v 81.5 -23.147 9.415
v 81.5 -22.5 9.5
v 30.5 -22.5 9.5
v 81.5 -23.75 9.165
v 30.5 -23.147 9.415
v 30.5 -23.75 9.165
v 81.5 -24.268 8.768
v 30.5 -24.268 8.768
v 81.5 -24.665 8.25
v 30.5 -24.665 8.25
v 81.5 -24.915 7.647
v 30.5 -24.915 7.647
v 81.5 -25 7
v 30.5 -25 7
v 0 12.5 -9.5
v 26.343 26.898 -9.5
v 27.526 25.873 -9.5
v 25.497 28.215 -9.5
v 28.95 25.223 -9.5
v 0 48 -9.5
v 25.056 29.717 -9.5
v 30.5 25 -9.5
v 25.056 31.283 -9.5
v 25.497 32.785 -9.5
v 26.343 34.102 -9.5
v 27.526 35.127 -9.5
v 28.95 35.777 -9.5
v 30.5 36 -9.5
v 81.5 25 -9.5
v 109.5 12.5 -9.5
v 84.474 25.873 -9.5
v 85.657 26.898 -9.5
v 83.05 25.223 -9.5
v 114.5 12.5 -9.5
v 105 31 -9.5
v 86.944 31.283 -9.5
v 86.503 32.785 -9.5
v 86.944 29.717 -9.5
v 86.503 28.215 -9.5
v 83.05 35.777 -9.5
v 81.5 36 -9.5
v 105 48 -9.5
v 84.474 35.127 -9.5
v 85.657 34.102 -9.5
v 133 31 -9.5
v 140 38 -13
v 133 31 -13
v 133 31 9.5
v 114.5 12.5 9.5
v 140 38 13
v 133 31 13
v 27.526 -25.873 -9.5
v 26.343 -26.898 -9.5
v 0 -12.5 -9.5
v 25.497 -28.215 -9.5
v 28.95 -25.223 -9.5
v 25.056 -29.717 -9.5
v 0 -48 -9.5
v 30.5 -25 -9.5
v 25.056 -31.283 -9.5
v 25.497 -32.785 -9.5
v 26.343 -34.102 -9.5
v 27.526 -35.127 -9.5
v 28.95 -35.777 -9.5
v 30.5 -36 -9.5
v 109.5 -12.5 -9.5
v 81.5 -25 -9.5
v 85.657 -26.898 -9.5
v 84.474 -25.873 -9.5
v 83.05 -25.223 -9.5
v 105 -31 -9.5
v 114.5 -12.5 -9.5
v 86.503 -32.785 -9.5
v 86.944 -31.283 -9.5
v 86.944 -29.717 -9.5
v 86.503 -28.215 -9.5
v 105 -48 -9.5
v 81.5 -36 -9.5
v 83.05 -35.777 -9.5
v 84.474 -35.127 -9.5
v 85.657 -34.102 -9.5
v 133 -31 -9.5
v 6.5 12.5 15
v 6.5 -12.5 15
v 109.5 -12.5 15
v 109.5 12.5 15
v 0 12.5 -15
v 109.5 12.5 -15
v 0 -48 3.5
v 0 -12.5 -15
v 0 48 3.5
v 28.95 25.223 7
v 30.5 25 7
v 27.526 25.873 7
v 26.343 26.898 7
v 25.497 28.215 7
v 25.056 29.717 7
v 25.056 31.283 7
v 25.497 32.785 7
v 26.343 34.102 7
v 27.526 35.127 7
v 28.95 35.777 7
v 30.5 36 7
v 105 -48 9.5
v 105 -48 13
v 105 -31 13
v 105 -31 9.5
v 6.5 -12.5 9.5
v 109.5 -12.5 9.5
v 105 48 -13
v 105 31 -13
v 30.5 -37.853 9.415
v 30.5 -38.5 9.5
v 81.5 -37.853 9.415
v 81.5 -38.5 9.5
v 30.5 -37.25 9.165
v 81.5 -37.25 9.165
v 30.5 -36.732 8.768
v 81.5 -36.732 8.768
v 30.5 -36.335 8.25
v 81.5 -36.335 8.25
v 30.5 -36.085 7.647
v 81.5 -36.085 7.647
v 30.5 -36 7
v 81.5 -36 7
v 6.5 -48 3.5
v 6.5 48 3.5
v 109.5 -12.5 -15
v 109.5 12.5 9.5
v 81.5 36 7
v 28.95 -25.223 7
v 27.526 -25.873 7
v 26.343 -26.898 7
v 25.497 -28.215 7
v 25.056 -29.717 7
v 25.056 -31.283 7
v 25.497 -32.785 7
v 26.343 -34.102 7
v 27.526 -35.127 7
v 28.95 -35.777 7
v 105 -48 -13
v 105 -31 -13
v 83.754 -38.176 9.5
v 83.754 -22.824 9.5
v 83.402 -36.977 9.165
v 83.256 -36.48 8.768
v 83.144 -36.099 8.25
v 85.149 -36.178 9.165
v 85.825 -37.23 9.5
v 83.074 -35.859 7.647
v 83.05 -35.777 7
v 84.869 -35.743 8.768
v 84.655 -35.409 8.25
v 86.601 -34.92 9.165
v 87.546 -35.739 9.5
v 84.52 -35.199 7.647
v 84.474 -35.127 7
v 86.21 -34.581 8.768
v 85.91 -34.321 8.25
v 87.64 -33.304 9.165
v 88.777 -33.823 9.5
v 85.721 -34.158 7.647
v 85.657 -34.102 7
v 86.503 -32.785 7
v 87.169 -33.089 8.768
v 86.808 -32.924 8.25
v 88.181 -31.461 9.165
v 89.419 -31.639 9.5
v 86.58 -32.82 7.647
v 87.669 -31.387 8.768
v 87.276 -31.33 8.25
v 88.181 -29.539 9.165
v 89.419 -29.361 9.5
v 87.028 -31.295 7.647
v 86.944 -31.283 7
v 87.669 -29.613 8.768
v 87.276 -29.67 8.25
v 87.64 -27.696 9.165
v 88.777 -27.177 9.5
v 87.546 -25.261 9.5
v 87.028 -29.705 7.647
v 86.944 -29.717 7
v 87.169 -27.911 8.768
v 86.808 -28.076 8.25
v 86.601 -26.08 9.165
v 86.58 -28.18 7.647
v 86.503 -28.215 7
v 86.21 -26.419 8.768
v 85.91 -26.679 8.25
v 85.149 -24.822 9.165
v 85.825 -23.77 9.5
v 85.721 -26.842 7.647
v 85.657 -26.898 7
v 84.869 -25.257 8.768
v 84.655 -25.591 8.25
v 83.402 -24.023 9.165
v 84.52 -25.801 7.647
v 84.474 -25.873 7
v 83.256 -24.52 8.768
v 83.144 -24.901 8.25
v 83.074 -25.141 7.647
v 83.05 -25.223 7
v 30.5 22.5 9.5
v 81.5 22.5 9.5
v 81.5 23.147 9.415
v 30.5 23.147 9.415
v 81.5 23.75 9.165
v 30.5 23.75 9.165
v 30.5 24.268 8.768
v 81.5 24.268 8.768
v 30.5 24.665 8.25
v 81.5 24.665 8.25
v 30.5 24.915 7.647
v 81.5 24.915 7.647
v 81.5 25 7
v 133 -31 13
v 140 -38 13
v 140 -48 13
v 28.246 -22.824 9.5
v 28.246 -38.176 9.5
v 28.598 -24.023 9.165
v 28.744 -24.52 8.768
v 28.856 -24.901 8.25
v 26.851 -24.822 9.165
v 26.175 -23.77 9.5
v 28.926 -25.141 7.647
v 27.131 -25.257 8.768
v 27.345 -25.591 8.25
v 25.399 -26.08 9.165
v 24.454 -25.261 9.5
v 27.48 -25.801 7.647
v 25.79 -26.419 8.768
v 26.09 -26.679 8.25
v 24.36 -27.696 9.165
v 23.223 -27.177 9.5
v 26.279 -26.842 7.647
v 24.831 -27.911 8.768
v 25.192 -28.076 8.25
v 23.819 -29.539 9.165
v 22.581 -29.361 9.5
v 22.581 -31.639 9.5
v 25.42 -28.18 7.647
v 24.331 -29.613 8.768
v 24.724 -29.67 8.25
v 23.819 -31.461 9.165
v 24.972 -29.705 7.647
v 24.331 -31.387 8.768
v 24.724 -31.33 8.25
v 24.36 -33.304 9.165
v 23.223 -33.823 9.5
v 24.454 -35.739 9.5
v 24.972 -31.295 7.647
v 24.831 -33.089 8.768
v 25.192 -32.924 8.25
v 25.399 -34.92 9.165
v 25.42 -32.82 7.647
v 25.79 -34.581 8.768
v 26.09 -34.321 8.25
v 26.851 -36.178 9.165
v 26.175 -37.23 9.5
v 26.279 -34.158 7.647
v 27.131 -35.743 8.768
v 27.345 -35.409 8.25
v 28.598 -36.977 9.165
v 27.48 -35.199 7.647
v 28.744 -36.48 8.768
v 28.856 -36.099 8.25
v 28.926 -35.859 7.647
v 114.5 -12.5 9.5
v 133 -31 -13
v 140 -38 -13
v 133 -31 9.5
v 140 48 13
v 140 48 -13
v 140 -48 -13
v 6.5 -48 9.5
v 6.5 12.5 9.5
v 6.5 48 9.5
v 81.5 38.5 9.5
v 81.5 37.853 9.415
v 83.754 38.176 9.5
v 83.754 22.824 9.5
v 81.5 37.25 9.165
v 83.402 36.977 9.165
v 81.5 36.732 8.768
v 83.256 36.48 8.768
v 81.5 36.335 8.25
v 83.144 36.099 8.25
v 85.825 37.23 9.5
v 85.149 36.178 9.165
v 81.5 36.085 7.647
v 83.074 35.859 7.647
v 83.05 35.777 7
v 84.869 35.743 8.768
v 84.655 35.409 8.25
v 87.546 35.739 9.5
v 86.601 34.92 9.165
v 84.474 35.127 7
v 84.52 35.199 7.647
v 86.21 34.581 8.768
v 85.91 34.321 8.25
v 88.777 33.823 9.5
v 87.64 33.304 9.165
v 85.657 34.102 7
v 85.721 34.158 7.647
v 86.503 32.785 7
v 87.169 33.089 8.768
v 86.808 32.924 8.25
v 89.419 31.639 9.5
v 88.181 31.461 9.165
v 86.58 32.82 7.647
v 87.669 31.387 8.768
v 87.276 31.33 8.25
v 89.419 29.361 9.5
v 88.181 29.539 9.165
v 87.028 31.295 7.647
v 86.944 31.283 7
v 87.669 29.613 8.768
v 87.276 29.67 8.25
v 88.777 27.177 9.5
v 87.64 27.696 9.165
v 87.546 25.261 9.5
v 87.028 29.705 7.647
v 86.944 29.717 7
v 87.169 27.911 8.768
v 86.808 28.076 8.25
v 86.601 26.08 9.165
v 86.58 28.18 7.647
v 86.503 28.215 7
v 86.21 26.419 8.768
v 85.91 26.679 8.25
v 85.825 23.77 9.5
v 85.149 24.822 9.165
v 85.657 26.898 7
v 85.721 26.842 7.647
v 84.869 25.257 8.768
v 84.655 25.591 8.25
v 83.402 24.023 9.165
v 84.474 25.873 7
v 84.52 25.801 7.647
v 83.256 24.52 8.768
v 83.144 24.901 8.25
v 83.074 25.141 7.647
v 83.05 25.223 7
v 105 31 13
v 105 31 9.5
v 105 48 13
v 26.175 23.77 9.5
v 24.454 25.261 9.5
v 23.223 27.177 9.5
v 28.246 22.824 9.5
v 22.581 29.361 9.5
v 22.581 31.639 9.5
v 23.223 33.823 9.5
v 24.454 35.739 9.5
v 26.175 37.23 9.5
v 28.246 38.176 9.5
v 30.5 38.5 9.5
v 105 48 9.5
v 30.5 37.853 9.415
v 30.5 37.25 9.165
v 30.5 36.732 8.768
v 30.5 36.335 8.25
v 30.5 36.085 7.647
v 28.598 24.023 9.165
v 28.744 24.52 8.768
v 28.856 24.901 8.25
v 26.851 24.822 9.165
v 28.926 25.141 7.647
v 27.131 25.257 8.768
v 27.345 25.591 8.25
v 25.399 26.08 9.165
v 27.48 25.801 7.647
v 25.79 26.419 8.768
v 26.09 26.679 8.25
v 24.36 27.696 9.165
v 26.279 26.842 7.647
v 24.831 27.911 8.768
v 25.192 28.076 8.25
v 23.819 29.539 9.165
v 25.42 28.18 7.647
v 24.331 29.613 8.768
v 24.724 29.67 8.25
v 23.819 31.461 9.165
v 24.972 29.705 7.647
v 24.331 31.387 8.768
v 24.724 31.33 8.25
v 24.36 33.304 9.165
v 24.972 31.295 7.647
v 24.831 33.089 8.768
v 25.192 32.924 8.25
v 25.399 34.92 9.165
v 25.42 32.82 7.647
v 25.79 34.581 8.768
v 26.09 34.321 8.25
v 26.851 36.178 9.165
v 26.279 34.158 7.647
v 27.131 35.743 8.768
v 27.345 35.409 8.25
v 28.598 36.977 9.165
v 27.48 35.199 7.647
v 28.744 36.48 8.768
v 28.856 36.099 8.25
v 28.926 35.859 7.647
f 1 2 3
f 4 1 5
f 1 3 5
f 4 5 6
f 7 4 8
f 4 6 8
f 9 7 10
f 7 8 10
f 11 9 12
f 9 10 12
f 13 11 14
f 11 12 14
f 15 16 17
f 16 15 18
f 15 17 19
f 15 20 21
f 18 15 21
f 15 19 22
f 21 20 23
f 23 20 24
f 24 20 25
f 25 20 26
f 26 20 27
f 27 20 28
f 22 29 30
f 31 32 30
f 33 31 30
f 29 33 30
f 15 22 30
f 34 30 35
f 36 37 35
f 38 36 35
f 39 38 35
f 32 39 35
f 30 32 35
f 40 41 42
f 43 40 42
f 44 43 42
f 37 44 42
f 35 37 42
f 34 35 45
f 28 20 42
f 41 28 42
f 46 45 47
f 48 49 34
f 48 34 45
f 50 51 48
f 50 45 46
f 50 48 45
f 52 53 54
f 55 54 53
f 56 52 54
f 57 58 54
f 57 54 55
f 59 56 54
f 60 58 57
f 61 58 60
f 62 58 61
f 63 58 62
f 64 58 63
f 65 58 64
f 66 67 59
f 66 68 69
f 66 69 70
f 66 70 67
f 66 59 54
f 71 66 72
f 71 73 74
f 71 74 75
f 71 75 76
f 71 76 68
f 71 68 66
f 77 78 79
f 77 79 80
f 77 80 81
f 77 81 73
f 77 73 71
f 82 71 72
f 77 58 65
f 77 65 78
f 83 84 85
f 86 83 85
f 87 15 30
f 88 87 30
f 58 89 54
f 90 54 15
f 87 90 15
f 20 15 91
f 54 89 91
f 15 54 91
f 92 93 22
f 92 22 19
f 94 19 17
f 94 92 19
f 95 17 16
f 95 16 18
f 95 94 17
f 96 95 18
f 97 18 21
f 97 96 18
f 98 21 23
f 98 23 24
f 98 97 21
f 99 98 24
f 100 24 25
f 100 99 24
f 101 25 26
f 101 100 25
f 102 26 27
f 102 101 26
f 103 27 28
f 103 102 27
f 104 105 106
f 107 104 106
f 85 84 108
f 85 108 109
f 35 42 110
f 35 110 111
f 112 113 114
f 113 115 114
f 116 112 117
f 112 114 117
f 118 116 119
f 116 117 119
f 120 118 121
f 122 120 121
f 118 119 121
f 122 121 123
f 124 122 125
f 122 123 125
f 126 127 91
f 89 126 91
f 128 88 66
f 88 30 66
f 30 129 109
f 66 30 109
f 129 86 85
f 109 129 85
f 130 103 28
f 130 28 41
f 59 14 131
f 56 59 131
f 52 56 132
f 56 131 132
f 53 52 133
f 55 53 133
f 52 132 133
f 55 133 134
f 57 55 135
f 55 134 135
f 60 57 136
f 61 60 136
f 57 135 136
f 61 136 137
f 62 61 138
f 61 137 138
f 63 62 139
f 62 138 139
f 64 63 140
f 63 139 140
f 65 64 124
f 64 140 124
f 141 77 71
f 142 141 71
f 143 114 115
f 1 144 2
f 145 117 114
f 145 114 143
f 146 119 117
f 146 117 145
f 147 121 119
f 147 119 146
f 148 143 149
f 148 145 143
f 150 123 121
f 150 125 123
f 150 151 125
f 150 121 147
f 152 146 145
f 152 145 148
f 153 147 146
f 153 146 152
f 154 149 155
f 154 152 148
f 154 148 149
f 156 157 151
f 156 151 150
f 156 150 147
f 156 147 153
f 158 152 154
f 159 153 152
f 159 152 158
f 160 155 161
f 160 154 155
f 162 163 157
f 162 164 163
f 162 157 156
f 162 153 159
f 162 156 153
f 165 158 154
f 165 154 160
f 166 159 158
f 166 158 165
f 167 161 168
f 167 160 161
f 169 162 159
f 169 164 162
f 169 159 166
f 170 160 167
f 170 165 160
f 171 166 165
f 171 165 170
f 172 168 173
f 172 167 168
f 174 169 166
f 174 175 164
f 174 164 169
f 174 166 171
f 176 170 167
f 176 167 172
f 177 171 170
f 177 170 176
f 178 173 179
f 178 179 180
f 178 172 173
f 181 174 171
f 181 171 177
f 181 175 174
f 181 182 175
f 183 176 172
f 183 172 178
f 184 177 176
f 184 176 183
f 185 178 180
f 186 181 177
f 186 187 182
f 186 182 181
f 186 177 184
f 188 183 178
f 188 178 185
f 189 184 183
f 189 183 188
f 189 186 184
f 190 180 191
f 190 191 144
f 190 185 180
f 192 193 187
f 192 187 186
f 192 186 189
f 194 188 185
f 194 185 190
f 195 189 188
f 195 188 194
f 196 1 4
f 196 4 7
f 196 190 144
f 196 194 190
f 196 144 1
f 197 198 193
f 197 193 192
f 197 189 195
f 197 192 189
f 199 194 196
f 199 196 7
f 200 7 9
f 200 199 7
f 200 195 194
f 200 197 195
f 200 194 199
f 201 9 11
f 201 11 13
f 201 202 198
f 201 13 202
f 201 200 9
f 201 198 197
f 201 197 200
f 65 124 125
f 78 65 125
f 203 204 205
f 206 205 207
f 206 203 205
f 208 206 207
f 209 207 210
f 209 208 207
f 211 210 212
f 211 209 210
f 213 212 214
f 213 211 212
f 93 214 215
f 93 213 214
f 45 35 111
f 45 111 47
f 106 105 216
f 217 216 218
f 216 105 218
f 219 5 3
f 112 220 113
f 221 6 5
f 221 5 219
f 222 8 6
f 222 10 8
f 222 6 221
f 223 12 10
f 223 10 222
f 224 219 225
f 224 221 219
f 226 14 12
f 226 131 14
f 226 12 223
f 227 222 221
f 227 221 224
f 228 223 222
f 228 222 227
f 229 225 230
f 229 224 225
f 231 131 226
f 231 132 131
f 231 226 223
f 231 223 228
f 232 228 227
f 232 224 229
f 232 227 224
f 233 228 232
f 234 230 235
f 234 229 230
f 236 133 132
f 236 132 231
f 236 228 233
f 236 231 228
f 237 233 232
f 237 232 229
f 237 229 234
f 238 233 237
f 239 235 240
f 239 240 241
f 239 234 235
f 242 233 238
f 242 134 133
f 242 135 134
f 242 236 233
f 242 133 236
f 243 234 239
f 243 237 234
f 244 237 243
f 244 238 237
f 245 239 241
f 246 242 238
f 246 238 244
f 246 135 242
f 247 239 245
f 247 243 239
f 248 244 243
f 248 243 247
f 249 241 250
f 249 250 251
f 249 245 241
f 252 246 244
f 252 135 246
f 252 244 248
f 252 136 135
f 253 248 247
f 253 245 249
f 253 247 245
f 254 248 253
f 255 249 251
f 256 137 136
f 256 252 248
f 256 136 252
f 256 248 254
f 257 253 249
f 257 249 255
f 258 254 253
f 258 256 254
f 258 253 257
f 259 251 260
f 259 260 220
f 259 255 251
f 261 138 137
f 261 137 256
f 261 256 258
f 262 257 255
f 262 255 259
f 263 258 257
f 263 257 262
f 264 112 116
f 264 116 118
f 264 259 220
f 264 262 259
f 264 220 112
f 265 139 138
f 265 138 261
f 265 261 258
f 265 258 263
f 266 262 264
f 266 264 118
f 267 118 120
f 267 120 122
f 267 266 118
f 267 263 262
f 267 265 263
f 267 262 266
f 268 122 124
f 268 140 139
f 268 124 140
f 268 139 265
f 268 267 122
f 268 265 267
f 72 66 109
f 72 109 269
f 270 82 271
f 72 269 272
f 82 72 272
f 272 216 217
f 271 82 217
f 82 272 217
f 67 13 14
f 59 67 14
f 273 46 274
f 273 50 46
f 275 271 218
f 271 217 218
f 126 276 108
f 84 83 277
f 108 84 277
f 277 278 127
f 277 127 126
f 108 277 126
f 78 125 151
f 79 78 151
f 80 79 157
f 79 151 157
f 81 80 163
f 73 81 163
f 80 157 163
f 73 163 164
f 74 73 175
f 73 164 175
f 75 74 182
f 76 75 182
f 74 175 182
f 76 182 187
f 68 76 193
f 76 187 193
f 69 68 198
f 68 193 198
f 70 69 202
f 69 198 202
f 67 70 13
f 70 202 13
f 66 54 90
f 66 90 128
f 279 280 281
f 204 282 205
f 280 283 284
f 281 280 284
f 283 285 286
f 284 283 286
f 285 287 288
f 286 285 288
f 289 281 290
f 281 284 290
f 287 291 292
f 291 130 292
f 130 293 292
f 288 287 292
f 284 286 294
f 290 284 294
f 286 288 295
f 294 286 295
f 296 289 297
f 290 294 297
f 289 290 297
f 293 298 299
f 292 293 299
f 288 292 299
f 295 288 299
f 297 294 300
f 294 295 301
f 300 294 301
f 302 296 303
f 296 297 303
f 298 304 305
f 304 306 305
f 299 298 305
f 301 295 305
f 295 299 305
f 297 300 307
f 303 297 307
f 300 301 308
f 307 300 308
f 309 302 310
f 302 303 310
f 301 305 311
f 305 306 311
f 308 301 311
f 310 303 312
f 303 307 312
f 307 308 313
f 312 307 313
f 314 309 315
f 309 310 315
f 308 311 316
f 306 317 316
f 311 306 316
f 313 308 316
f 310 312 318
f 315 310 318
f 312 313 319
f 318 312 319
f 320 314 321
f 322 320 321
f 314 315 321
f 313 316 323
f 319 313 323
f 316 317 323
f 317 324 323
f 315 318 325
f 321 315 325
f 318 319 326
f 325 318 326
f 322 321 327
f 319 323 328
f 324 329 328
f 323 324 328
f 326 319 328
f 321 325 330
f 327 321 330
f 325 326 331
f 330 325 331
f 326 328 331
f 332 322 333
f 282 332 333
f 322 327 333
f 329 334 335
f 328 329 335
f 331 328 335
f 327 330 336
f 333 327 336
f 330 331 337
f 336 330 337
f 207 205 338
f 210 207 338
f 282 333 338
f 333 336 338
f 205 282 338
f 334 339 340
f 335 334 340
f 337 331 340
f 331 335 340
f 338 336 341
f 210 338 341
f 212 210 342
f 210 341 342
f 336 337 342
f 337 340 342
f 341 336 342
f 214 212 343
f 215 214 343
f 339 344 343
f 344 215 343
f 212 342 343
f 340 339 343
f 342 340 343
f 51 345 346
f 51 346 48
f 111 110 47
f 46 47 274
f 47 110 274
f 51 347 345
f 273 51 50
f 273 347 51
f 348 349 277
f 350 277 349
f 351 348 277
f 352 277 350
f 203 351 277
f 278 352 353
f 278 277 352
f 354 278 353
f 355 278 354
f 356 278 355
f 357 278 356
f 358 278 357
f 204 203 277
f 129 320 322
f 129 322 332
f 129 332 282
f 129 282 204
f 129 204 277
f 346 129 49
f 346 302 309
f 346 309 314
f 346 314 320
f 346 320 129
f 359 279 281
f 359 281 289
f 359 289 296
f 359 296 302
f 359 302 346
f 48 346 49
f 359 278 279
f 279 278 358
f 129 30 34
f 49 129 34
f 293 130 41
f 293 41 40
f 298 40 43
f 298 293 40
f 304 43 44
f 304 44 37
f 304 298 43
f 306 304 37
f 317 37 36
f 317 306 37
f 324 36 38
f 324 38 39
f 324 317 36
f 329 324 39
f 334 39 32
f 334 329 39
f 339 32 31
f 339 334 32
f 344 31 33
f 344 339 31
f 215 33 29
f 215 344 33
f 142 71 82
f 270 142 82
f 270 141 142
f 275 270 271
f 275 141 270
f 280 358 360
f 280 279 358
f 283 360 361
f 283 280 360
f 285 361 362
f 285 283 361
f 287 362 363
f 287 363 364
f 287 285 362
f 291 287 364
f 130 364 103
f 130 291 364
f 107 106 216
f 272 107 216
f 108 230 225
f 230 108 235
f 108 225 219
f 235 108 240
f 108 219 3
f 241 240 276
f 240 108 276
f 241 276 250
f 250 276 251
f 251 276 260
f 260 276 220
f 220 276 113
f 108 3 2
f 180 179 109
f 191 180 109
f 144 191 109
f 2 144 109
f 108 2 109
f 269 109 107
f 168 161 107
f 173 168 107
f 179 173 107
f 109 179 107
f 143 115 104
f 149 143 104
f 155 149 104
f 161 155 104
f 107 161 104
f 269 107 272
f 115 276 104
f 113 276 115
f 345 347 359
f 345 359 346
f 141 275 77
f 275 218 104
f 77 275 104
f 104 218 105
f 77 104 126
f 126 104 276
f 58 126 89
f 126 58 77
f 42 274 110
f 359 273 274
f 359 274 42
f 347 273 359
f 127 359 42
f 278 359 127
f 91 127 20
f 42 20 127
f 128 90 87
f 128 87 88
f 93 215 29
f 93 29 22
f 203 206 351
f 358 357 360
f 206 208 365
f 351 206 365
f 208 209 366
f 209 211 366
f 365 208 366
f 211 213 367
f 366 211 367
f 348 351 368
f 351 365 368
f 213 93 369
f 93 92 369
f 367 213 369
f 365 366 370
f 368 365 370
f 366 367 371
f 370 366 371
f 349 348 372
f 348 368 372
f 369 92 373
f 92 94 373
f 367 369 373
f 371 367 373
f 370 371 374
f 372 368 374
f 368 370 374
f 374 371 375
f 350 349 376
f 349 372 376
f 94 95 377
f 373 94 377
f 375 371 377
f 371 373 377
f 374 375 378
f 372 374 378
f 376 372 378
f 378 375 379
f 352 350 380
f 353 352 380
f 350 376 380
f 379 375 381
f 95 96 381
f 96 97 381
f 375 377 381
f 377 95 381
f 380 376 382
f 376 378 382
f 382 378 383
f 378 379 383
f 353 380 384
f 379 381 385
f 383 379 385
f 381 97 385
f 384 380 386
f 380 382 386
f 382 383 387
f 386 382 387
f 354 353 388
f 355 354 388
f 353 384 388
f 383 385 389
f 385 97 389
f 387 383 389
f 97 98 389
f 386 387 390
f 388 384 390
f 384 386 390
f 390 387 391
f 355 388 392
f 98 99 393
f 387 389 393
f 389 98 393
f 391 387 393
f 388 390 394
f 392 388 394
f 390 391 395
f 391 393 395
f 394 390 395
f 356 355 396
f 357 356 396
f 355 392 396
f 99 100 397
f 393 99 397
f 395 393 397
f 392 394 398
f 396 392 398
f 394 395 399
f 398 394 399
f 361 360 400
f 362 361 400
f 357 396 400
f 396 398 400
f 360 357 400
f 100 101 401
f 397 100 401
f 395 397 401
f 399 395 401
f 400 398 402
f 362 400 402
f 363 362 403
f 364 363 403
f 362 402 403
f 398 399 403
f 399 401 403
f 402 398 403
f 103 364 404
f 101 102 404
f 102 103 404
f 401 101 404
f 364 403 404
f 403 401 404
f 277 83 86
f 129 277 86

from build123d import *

# Parameters (mm, degrees)
SKETCH2_W               = 109.5
SKETCH2_H               = 12.5
BOSS_EXTRUDE1_DEPTH     = 15
BOSS_EXTRUDE2_DEPTH     = 9.5
BOSS_EXTRUDE3_DEPTH     = 13
CUT_EXTRUDE2_DEPTH      = 149.758193052
CUT_EXTRUDE2_DEPTH_BACK = 149.758193052
FILLET2_R               = 2.5


with BuildPart() as part:
    # Sketch2 → Boss-Extrude1 (new, symmetric)
    with BuildSketch(Plane.XY):
        with Locations((54.75, 6.25)):
            Rectangle(SKETCH2_W, SKETCH2_H)
    extrude(amount=BOSS_EXTRUDE1_DEPTH, both=True)

    # Sketch2<3> → Boss-Extrude2 (add, symmetric)
    with BuildSketch(Plane.XY):
        Polygon((0, 48), (0, 12.5), (109.5, 12.5), (114.5, 12.5), (133, 31), (105, 31), (105, 48), align=None)
        with BuildLine():
            ThreePointArc((30.5, 25), (25, 30.5), (30.5, 36))
            Line((30.5, 36), (81.5, 36))
            ThreePointArc((81.5, 36), (87, 30.5), (81.5, 25))
            Line((81.5, 25), (30.5, 25))
        make_face(mode=Mode.SUBTRACT)
    extrude(amount=BOSS_EXTRUDE2_DEPTH, both=True)

    # Sketch2<4> → Boss-Extrude3 (add, symmetric)
    with BuildSketch(Plane.XY):
        Polygon((140, 48), (105, 48), (105, 31), (133, 31), (140, 38), align=None)
    extrude(amount=BOSS_EXTRUDE3_DEPTH, both=True)

    # Sketch3 → Cut-Extrude2 (cut, two sides: drawn at the far end of the back side and taken through both)
    with BuildSketch(Plane(origin=(0, 48, 0), x_dir=(1, 0, 0), z_dir=(0, 1, 0)).offset(-CUT_EXTRUDE2_DEPTH_BACK)):
        Polygon((-292.434063101, -3.5), (0, -3.5), (6.5, -3.5), (6.5, -15), (6.5, -307.434063101), (-410.479849846, -717.554203878), (-709.413912948, -413.620140776), align=None)
    extrude(amount=CUT_EXTRUDE2_DEPTH + CUT_EXTRUDE2_DEPTH_BACK, mode=Mode.SUBTRACT)

    # Fillet2
    fillet2_edges = [part.edges().sort_by_distance(p)[0] for p in [
        (87, 30.5, 9.5),
        (56, 25, 9.5),
        (25, 30.5, 9.5),
        (56, 36, 9.5),
    ]]
    fillet(fillet2_edges, radius=FILLET2_R)

    # Mirror3: part across plane


with BuildPart() as part_1:
    add(part.part)
    add(part.part.mirror(Plane(origin=(0, 0, 15), x_dir=(0, 0, 1), z_dir=(0, -1, 0))))


solid = part_1.part
